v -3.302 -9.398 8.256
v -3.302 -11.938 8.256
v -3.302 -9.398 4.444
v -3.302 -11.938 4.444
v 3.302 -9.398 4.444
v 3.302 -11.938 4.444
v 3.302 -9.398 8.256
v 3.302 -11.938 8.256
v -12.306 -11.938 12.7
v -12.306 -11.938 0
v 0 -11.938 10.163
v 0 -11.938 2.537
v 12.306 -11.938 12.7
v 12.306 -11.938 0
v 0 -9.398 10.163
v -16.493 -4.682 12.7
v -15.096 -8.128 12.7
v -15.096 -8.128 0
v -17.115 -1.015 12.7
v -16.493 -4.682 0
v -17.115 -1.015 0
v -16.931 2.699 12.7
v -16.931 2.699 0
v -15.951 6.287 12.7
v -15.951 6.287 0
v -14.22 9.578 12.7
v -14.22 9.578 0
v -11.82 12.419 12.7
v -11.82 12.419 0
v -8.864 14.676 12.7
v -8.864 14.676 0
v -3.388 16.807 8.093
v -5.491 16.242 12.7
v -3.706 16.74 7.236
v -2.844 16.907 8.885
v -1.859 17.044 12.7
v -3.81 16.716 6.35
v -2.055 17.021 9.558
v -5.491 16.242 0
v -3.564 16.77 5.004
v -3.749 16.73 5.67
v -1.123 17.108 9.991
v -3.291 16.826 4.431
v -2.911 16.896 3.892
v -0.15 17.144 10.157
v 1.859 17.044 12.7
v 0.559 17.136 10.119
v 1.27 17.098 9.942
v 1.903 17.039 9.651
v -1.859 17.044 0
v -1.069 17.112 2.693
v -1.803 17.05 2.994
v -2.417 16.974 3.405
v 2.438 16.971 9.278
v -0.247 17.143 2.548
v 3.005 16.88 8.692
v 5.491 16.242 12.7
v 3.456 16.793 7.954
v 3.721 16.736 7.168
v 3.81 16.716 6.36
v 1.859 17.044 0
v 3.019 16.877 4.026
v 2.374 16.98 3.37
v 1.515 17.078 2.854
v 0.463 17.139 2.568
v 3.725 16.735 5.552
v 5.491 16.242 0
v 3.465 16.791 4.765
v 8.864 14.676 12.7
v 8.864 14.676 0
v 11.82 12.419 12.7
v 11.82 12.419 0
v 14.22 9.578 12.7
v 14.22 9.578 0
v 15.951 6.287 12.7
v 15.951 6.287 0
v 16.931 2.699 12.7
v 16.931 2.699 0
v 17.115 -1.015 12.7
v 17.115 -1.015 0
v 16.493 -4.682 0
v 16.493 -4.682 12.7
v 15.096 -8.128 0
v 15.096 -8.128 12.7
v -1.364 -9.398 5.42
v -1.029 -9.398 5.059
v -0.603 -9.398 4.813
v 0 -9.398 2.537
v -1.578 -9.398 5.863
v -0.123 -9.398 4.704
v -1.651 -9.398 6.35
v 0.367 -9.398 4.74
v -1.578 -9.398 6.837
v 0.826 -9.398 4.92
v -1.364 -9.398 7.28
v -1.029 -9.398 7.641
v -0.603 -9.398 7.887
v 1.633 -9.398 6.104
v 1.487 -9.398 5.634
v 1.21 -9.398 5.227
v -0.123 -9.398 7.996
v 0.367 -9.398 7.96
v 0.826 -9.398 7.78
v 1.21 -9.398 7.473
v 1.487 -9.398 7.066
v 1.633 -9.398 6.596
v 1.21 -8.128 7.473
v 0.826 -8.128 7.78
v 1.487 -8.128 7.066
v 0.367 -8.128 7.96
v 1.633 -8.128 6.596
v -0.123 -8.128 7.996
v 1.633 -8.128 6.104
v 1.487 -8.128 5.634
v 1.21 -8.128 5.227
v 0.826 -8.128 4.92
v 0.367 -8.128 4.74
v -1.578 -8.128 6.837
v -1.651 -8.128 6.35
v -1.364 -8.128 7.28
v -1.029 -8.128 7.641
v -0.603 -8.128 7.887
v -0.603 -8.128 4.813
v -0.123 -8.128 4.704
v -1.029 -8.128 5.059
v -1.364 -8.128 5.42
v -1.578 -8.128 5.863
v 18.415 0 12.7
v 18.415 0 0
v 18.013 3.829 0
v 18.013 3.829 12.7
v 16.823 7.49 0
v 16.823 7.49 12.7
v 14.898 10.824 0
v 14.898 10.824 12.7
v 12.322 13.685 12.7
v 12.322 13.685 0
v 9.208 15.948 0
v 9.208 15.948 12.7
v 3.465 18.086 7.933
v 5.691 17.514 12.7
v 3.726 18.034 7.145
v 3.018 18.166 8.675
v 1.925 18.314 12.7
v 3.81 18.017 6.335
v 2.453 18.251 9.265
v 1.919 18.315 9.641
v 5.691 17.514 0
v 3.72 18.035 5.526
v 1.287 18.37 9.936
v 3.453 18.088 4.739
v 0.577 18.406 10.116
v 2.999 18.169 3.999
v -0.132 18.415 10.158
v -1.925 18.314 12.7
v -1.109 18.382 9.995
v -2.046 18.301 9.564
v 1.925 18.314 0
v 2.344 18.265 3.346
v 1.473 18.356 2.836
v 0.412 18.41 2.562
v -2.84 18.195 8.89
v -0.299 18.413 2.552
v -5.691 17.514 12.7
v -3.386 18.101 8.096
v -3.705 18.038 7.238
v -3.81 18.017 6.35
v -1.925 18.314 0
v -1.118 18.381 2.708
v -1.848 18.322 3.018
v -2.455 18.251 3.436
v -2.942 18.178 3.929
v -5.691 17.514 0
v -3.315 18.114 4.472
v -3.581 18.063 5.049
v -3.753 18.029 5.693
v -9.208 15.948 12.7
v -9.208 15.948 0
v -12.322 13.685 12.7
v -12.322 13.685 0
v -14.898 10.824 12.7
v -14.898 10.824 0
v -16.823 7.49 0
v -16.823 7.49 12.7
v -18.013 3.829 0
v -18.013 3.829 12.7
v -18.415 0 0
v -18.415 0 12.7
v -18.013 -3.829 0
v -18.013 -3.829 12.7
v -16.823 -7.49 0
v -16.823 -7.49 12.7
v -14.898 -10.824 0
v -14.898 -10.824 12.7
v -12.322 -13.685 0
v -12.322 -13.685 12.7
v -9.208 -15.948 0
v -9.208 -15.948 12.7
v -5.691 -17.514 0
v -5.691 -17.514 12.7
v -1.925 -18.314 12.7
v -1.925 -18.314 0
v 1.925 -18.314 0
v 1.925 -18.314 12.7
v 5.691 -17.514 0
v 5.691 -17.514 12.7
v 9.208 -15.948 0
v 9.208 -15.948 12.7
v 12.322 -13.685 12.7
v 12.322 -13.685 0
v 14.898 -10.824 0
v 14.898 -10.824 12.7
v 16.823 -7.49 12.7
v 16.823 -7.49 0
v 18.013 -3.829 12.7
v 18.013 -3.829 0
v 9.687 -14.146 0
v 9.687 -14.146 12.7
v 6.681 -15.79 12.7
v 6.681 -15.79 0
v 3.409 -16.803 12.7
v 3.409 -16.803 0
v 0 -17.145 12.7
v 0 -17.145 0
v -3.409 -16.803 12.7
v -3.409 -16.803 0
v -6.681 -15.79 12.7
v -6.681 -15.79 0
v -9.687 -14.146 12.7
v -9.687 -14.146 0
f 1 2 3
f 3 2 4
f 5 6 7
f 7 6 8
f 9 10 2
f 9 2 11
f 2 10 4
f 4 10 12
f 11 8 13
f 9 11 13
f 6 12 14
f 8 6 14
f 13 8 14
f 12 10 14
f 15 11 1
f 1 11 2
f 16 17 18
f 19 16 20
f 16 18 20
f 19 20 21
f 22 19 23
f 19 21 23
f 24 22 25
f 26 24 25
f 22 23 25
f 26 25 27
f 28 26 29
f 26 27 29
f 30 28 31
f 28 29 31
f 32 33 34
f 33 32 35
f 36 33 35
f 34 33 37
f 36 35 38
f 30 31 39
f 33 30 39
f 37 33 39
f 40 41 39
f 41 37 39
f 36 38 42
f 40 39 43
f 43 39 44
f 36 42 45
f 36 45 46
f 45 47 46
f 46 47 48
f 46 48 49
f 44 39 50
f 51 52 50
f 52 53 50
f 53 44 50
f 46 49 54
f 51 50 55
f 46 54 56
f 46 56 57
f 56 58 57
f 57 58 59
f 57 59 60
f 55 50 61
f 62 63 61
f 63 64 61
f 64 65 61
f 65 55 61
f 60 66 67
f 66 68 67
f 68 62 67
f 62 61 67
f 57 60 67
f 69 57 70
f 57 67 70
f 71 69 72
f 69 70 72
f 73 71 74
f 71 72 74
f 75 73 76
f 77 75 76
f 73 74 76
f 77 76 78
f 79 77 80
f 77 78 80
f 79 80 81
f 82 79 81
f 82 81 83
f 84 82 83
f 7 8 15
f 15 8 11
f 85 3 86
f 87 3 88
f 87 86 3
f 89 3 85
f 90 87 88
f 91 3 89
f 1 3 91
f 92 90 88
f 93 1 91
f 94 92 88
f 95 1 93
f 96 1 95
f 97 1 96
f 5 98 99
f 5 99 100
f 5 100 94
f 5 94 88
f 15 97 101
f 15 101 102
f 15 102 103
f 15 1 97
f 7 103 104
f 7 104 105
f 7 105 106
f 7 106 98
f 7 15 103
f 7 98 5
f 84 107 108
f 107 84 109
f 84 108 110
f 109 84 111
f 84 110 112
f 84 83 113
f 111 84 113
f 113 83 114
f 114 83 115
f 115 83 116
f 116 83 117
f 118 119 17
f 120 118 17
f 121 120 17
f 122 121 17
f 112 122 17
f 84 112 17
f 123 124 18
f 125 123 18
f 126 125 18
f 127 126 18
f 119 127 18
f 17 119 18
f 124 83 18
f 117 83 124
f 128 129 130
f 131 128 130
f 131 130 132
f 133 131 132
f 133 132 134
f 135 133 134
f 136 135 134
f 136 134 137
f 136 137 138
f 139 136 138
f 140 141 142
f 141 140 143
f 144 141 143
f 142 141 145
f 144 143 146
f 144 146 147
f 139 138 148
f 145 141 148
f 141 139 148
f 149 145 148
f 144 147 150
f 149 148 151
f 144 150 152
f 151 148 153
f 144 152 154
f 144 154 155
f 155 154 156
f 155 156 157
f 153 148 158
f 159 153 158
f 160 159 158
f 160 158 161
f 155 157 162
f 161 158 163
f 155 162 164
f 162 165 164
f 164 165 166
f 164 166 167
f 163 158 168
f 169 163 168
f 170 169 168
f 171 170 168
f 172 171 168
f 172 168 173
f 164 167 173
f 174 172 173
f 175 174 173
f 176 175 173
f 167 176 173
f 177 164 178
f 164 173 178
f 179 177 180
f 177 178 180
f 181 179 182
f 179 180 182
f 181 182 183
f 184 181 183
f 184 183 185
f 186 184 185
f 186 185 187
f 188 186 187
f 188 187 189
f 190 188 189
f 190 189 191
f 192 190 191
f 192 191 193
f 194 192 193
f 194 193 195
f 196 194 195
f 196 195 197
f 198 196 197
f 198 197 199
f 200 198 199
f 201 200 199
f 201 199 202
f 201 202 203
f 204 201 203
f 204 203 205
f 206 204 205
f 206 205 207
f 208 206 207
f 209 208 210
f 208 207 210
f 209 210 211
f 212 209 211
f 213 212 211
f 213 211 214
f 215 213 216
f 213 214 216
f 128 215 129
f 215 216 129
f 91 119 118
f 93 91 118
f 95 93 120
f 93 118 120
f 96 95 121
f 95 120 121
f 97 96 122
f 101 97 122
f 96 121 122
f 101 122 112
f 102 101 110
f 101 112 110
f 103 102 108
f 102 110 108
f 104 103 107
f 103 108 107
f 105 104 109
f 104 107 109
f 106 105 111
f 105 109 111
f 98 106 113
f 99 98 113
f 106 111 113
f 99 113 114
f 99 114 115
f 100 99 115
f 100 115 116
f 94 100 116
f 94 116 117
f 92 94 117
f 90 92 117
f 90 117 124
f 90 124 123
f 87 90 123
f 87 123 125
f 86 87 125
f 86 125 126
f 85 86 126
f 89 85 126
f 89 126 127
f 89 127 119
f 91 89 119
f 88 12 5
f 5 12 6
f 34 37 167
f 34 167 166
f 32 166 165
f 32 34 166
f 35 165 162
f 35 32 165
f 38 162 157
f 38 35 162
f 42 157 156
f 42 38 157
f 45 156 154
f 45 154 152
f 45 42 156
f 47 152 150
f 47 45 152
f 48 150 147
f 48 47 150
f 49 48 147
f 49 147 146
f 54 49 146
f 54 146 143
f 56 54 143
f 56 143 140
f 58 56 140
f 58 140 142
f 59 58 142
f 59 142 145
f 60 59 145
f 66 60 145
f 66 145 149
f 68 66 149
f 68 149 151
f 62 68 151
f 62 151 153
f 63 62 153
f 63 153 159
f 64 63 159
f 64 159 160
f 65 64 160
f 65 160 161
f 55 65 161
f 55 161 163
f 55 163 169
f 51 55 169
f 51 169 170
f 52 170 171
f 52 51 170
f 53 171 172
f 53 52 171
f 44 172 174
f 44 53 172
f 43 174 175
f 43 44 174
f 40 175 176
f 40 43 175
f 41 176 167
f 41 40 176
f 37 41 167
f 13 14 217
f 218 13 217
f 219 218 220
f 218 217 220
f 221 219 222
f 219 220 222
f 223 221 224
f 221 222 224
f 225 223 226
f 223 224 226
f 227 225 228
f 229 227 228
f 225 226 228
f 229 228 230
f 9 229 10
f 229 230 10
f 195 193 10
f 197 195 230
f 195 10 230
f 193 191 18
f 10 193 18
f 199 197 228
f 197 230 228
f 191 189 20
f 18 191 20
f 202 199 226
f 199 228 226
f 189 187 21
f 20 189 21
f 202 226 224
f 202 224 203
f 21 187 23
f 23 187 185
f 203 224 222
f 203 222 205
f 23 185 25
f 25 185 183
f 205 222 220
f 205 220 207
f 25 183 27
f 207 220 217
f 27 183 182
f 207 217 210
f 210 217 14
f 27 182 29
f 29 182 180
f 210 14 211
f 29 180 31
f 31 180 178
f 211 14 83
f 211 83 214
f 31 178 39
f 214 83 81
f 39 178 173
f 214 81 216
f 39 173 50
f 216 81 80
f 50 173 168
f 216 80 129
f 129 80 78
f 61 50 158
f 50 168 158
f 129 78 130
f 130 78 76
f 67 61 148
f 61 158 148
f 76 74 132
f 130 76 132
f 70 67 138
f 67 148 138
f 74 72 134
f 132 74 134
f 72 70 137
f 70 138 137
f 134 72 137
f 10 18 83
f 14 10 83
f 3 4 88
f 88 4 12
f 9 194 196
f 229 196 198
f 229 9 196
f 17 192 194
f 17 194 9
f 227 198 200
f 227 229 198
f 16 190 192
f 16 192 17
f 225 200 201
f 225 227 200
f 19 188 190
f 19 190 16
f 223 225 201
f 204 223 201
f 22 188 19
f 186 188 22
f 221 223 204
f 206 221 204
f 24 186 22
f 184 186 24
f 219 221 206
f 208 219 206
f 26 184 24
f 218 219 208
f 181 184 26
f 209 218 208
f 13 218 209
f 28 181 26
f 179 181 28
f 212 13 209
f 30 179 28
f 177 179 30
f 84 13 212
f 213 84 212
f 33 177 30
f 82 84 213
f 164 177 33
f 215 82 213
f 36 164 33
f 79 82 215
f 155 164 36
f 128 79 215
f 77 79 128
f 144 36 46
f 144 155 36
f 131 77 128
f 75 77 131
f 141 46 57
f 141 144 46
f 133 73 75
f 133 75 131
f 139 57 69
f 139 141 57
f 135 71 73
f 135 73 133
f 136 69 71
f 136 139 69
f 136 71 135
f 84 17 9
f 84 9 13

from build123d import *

# Parameters (mm, degrees)
F0_R     = 18.415
F1_DEPTH = 12.7
F2_R     = 1.651
F3_DEPTH = 3.81
F5_DEPTH = 2.54
F6_R     = 3.81
F7_DEPTH = 26.544


with BuildPart() as f1:
    # F0 (on Top) → F1 (new body)
    with BuildSketch(Plane.XY):
        Circle(F0_R)
        with BuildLine():
            ThreePointArc((12.3059, -11.938), (0, -17.145), (-12.3059, -11.938))
            Line((-12.3059, -11.938), (12.3059, -11.938))
        make_face(mode=Mode.SUBTRACT)
        with BuildLine():
            Line((15.095915, -8.128), (-15.095915, -8.128))
            ThreePointArc((-15.095915, -8.128), (0, 17.145), (15.095915, -8.128))
        make_face(mode=Mode.SUBTRACT)
    extrude(amount=F1_DEPTH)

    # F2 (on face) → F3 (cut, through all)
    with BuildSketch(Plane(origin=(0, -8.128, 0), x_dir=(-1, 0, 0), z_dir=(0, 1, 0))):
        with Locations((0, 6.35)):
            Circle(F2_R)
    extrude(amount=-F3_DEPTH, mode=Mode.SUBTRACT)

    # F4 (on face) → F5 (cut)
    with BuildSketch(Plane.XZ.offset(11.938)):
        Polygon((3.302, 4.443589), (3.302, 8.256411), (0, 10.162821), (-3.302, 8.256411), (-3.302, 4.443589), (0, 2.537179), align=None)
    extrude(amount=-F5_DEPTH, mode=Mode.SUBTRACT)

    # F6 (on face) → F7 (cut, through all)
    with BuildSketch(Plane(origin=(0, -8.128, 0), x_dir=(-1, 0, 0), z_dir=(0, 1, 0))):
        with Locations((0, 6.35)):
            Circle(F6_R)
    extrude(amount=F7_DEPTH, mode=Mode.SUBTRACT)


solid = f1.part
